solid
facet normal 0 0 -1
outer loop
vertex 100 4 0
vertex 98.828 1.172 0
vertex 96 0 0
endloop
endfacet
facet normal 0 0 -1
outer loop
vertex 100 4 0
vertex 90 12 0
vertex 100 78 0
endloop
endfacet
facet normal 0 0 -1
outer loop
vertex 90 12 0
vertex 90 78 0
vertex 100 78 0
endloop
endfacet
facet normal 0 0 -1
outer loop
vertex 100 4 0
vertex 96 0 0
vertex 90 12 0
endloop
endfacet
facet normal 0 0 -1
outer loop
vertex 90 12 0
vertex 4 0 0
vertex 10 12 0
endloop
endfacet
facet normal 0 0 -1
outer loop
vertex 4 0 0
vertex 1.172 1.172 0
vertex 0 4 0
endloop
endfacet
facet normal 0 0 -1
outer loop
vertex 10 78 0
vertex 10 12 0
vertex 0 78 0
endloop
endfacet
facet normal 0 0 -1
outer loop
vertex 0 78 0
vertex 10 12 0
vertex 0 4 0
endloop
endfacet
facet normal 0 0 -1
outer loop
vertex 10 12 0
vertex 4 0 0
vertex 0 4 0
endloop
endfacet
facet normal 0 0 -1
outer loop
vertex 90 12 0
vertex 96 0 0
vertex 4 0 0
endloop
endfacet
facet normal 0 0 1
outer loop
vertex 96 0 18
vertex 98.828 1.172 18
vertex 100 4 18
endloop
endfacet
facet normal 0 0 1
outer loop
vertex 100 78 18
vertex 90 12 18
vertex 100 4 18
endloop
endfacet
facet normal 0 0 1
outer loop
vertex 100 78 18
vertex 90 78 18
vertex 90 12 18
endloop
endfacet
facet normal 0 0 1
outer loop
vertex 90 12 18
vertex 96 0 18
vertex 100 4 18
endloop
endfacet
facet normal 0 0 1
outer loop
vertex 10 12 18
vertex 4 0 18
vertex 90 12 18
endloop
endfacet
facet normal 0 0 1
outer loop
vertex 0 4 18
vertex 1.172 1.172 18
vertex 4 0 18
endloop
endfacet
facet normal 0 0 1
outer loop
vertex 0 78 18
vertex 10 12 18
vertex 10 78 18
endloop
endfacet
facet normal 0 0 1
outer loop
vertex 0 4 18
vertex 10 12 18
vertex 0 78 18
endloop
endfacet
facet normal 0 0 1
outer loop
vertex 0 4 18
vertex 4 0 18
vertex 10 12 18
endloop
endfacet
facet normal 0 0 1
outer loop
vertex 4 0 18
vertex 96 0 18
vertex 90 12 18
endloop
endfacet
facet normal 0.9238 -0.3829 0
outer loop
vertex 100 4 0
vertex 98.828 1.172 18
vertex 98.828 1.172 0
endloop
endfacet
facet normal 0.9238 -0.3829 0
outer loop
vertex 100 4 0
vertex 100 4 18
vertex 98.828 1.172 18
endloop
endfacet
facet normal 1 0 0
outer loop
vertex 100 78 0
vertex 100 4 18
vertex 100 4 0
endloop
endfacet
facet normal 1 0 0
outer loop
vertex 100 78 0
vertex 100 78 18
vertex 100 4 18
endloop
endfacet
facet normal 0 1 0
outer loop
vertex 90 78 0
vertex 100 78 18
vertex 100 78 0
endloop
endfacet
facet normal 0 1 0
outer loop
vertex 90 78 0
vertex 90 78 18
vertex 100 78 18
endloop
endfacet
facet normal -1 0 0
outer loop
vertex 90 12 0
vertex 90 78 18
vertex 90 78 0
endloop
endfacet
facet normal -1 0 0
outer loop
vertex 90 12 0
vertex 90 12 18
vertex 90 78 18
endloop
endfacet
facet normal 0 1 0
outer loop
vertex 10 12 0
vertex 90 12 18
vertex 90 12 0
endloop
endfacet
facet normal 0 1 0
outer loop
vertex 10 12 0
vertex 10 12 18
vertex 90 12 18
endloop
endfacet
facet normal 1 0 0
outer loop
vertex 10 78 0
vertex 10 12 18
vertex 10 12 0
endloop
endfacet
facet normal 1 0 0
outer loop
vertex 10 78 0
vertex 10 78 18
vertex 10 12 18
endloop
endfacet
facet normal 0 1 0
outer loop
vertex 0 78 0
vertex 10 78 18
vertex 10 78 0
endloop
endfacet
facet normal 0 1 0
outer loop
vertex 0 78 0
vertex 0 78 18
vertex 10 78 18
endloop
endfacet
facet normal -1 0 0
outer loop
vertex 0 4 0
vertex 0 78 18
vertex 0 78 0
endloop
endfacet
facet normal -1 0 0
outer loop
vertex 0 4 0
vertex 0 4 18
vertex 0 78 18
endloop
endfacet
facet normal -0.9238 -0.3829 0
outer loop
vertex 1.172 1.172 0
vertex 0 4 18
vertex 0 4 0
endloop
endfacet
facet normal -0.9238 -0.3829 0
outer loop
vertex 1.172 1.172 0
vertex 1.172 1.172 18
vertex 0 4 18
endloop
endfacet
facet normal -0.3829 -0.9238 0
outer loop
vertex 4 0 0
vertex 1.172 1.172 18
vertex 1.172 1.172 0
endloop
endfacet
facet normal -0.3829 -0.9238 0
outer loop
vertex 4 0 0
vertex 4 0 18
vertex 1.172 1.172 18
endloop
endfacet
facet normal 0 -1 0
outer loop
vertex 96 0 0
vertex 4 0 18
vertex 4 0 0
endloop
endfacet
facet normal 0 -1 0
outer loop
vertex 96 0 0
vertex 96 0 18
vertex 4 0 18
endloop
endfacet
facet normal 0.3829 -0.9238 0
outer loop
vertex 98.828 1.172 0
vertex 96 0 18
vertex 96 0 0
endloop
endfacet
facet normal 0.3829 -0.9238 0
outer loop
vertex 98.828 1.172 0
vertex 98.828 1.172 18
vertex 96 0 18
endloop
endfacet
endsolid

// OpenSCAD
$fn = 32;

// ----------------------------------------------------------------------
// Heat sink frame: 100 x 78 mm frame, 10 mm walls
// ----------------------------------------------------------------------

// --- parameters (mm) ---
profile_height = 18;      // extrusion height
profile_points = 12;      // points of the closed outline

profile = [[0, 4], [1.172, 1.172], [4, 0], [96, 0], [98.828, 1.172], [100, 4], [100, 78], [90, 78], [90, 12], [10, 12], [10, 78], [0, 78]];  // single closed polygon, 12 points, counter clockwise

// --- the one profile operation ---
linear_extrude(height = profile_height) polygon(points = profile);
